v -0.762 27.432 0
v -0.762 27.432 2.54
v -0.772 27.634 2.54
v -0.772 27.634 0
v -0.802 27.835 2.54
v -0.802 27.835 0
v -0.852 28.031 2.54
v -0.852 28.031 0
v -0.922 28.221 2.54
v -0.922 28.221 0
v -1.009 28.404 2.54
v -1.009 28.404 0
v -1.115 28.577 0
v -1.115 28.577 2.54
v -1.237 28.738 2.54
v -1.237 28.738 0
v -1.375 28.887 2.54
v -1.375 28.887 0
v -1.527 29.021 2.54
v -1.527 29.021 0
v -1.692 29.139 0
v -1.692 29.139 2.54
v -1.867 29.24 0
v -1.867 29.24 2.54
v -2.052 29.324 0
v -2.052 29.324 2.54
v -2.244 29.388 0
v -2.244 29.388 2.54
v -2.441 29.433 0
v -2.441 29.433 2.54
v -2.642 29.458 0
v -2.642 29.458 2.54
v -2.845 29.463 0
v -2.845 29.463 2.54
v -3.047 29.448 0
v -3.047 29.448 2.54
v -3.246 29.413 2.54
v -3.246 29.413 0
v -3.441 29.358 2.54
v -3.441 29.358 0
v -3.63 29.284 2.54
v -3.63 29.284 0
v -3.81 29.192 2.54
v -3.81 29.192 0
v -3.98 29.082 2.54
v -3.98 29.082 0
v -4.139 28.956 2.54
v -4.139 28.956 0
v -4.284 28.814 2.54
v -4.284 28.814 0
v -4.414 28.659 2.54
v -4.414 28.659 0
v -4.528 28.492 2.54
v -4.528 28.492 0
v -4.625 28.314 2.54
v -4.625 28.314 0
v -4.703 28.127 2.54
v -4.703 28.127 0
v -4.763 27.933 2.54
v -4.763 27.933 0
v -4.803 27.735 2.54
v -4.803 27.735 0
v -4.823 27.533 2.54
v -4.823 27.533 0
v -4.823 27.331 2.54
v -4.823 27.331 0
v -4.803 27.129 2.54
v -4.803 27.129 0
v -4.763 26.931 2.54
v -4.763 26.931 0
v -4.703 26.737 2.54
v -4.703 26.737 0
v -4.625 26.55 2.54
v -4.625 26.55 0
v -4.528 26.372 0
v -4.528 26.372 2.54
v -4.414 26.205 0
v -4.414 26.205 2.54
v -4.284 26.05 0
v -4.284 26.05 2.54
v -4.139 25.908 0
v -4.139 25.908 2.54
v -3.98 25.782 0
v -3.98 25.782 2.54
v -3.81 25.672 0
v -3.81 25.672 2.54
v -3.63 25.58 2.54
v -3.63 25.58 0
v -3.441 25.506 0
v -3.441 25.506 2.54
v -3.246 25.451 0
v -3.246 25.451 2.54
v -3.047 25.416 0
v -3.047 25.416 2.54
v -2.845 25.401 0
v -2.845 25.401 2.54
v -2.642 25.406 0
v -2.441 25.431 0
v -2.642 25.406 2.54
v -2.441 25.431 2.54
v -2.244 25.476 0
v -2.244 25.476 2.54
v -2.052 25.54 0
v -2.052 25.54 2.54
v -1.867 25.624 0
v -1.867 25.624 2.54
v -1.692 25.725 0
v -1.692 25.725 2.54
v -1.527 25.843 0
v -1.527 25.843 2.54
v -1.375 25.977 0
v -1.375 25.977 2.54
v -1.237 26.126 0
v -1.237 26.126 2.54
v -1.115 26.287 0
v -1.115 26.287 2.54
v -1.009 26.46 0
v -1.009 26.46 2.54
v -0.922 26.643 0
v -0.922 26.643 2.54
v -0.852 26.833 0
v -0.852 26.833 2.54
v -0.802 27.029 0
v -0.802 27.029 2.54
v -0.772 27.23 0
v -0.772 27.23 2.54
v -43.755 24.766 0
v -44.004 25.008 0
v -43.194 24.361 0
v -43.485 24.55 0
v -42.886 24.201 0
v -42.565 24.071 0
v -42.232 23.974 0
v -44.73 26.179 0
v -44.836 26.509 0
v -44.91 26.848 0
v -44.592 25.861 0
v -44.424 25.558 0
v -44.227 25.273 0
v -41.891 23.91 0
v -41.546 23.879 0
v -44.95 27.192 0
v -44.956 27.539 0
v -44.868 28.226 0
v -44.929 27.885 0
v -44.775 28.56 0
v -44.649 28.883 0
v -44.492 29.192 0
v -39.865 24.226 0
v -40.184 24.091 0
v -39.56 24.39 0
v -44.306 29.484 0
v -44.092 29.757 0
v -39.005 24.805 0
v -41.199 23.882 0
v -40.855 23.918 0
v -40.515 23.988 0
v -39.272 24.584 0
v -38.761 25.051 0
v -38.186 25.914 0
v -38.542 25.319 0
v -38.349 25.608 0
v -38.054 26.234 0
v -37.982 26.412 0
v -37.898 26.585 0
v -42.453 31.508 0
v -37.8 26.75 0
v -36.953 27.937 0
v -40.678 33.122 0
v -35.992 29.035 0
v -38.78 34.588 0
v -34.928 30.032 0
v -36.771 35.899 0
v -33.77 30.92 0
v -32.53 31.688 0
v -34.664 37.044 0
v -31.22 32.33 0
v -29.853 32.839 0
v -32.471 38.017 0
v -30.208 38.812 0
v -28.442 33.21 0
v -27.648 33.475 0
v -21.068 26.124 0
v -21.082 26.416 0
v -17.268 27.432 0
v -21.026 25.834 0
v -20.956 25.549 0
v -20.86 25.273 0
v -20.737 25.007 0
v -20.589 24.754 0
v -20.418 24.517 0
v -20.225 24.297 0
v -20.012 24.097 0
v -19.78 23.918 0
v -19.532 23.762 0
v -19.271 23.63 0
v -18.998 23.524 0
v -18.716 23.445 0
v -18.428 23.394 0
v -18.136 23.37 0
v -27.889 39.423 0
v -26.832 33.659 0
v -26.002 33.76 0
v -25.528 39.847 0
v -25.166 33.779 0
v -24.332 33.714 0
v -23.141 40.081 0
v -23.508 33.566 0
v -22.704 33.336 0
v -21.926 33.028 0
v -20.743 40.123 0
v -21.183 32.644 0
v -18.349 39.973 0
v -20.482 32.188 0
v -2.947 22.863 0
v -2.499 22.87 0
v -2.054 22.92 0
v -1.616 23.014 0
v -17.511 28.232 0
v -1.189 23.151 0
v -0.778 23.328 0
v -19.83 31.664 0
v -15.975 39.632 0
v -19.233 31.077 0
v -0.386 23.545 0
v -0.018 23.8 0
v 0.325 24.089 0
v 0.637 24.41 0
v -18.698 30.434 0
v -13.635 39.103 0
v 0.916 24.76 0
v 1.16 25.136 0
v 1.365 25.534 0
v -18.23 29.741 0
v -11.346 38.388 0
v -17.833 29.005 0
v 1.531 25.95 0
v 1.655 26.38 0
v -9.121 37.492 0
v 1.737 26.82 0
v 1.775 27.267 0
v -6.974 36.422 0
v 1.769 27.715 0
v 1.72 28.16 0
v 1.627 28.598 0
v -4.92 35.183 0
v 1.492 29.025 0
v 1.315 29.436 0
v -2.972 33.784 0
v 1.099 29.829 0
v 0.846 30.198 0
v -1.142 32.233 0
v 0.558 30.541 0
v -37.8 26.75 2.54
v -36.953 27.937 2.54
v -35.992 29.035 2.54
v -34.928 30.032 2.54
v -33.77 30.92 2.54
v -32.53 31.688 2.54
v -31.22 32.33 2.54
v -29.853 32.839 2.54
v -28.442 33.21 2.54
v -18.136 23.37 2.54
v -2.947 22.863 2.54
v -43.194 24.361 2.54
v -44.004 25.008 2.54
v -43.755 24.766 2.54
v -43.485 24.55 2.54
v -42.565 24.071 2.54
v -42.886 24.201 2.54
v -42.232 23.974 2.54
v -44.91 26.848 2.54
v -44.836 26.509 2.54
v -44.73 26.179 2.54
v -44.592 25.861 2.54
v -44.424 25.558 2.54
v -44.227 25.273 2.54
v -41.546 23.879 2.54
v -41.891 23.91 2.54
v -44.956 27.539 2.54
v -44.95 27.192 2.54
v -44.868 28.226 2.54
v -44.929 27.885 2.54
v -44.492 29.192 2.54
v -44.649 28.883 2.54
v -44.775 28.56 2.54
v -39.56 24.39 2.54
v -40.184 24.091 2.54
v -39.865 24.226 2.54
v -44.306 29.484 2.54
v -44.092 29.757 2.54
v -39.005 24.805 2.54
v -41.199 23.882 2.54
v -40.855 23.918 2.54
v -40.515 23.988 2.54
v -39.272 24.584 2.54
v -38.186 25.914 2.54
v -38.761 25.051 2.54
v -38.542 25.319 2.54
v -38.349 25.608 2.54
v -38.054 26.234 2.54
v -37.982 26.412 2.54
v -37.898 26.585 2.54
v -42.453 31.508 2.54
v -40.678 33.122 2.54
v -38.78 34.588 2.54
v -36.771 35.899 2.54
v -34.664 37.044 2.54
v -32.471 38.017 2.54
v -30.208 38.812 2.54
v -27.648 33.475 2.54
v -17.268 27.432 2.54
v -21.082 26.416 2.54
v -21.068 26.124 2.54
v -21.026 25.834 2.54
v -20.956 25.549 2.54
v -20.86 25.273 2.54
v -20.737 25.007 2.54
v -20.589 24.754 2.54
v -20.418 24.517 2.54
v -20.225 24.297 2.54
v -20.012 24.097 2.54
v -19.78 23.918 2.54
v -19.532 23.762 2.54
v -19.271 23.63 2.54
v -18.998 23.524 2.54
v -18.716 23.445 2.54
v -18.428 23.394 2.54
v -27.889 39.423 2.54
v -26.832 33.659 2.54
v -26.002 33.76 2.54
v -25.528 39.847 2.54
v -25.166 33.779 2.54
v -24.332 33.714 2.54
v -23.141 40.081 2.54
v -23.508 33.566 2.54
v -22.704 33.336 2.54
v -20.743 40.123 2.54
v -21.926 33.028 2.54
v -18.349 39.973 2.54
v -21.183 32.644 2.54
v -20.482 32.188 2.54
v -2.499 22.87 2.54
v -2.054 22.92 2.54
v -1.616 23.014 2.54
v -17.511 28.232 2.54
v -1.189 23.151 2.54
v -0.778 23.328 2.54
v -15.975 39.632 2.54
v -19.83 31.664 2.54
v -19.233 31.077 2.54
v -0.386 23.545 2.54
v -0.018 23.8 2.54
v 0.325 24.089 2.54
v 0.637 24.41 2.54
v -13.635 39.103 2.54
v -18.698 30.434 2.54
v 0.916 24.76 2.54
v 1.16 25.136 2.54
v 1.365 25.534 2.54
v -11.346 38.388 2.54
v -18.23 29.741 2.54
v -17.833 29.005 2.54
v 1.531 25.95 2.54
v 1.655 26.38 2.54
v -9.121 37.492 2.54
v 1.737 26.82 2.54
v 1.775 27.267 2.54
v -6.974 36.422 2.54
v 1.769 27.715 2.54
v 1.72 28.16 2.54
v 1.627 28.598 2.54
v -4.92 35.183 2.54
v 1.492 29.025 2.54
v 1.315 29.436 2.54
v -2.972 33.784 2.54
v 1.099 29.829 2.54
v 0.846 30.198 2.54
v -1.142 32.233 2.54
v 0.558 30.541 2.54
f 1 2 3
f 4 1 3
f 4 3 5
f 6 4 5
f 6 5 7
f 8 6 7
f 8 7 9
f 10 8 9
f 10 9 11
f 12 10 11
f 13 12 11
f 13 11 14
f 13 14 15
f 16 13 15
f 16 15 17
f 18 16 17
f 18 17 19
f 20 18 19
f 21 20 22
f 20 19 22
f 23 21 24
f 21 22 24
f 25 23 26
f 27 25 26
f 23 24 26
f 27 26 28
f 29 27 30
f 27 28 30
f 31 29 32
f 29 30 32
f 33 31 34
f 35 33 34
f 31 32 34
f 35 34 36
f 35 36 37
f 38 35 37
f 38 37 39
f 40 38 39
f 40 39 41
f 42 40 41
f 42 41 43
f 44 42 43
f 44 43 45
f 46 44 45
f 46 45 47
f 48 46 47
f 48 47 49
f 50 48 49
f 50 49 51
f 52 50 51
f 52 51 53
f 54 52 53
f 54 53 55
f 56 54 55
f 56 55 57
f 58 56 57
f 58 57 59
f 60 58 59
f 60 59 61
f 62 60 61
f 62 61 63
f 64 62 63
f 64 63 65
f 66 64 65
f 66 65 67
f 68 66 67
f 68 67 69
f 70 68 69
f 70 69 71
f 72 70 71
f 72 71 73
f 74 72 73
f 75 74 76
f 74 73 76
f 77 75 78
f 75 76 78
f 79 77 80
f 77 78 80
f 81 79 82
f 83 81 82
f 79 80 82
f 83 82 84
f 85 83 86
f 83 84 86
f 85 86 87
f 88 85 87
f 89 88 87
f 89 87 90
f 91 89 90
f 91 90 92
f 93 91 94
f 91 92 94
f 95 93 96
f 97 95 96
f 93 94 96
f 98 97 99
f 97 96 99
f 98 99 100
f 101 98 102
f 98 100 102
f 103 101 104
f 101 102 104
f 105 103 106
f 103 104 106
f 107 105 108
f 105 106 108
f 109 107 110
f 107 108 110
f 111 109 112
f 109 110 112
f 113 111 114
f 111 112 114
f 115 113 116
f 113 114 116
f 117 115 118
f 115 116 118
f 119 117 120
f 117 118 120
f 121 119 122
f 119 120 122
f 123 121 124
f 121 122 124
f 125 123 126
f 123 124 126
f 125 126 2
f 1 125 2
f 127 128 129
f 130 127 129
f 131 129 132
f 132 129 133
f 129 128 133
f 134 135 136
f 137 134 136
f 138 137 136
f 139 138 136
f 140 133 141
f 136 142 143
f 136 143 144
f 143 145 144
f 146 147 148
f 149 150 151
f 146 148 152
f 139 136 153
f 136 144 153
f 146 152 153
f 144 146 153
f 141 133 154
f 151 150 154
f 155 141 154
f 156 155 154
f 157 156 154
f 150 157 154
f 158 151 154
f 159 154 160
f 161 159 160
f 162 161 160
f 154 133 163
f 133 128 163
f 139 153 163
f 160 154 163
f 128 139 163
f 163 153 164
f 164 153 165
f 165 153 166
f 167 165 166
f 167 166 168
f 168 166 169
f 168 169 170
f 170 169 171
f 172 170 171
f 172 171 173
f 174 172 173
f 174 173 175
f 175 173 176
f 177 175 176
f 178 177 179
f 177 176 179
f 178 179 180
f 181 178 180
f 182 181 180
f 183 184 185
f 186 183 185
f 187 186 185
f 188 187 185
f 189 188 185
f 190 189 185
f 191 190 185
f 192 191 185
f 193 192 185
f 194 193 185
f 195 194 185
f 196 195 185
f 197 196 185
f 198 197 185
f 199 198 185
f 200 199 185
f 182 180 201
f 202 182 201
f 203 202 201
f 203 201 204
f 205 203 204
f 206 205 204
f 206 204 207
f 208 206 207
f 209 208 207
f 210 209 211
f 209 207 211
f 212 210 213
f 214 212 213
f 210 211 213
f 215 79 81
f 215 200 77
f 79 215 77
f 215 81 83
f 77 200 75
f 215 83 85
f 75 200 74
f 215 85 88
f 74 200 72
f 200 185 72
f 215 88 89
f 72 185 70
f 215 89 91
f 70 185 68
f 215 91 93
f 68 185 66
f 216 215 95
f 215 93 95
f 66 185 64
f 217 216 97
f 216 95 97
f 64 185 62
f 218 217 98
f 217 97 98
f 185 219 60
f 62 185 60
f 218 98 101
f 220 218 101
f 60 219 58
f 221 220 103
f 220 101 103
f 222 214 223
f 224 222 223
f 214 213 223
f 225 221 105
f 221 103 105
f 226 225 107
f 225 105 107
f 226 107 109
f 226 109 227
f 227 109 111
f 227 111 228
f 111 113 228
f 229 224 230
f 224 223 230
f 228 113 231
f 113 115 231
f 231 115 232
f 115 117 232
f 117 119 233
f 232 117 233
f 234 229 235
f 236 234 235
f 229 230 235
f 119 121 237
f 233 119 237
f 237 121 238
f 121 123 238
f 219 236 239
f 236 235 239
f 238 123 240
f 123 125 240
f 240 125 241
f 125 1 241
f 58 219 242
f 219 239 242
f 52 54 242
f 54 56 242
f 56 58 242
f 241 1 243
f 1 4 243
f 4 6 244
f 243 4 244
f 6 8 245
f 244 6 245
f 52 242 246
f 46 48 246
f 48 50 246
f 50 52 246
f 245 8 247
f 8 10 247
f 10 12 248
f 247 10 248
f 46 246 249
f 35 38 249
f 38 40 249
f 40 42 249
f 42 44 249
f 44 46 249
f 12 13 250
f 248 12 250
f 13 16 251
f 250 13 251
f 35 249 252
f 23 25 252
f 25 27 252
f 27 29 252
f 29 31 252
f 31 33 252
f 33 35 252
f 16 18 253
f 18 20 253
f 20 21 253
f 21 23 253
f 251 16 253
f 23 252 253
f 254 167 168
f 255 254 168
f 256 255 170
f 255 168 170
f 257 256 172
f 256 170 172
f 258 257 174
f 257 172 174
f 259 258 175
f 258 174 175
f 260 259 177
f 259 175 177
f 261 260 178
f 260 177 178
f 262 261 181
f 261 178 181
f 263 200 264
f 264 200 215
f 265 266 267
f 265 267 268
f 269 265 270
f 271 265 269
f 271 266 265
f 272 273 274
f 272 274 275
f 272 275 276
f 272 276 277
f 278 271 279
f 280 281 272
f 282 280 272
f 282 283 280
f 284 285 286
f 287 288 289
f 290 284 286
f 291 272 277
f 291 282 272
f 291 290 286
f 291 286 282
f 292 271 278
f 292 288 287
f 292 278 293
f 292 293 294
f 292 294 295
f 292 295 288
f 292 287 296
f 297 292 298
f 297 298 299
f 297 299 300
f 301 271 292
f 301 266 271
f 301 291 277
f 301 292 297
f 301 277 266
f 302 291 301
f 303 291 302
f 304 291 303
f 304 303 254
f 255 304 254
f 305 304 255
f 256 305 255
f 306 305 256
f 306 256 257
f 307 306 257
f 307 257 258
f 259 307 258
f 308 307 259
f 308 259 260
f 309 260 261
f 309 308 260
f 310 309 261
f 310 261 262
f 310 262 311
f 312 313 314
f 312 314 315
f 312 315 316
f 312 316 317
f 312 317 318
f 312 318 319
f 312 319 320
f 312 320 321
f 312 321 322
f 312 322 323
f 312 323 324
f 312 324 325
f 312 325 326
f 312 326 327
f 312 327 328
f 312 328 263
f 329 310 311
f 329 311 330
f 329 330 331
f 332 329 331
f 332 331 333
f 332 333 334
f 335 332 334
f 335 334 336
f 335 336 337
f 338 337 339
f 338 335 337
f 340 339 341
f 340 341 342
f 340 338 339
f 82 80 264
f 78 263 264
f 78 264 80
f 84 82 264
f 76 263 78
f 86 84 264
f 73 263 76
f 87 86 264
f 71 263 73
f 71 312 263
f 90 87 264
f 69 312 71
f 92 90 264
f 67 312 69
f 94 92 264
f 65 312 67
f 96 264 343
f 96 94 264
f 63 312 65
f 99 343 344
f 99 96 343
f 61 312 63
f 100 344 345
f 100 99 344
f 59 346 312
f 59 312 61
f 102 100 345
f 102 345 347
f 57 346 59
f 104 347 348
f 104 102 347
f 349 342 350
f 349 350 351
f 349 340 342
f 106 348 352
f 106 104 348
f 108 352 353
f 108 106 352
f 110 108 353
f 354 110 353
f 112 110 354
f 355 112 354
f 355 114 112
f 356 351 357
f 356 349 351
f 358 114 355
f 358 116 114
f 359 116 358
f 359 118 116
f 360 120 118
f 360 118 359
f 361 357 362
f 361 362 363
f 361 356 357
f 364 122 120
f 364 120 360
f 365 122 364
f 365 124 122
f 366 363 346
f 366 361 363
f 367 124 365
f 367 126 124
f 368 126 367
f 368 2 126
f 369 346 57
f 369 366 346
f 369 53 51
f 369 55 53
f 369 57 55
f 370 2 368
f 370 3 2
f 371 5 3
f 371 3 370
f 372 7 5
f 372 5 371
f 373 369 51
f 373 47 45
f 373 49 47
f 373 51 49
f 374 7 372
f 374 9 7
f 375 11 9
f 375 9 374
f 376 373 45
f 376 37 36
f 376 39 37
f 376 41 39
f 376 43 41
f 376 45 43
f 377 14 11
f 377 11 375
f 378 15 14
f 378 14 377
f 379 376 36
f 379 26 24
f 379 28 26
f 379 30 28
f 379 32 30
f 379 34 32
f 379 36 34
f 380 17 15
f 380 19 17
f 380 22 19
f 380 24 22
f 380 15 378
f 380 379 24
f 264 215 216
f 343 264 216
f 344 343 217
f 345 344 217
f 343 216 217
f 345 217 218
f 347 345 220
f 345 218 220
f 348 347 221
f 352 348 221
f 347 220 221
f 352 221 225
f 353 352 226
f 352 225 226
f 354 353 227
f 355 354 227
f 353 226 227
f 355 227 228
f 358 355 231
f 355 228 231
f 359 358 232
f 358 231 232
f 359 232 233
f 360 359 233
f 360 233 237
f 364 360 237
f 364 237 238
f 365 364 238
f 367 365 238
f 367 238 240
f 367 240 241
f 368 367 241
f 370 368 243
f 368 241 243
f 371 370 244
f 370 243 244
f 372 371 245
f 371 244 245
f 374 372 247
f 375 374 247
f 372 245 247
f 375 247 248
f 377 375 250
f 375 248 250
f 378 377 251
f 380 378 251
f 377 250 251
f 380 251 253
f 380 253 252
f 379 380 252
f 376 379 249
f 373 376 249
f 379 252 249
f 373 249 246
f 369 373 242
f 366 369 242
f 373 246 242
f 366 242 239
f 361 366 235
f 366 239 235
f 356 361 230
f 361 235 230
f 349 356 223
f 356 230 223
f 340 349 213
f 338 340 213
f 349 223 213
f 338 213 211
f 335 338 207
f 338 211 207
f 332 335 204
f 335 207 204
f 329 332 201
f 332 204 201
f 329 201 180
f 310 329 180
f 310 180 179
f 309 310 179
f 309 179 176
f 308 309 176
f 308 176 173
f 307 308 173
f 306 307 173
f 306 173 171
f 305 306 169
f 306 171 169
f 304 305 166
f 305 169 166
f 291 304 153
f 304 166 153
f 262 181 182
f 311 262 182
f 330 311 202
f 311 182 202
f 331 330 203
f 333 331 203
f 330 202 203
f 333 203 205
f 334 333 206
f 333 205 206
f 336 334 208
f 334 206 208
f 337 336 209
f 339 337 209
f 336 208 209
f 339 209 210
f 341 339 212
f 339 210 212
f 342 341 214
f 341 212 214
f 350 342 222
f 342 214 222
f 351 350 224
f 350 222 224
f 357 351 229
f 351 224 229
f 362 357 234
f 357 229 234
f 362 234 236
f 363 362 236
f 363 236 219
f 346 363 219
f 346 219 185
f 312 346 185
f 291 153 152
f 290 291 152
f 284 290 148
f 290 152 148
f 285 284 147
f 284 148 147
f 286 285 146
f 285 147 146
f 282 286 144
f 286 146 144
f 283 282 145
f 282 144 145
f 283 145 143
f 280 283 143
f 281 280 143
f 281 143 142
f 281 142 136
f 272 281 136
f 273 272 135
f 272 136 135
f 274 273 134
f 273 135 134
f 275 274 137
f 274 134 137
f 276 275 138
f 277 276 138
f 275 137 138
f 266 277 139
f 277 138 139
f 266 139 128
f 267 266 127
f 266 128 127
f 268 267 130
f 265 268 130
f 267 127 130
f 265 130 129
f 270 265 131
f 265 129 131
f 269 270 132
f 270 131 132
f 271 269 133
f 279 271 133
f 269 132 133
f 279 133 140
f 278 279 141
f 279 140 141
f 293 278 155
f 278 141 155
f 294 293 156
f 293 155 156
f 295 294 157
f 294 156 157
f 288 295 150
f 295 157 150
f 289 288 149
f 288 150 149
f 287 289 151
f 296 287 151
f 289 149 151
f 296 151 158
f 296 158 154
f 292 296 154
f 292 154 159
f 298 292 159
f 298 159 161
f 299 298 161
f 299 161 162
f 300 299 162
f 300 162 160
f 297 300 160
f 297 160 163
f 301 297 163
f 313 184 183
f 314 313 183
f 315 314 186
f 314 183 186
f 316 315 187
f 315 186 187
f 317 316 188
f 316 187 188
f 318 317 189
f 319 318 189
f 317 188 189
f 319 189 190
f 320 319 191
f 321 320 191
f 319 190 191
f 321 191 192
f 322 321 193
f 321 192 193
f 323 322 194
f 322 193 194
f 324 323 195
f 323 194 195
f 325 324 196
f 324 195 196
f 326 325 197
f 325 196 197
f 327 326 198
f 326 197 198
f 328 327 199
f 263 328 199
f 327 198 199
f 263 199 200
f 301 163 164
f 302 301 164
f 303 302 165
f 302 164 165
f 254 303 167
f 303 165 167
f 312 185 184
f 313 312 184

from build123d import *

# Parameters (mm, degrees)
BOSS_EXTRUDE1_DEPTH = 2.54
SKETCH2_R           = 2.032
CUT_EXTRUDE1_DEPTH  = 61.316926471


with BuildPart() as part:
    # Sketch1 → Boss-Extrude1 (new body)
    with BuildSketch(Plane.XY):
        with BuildLine():
            Line((-18.135713172, 23.369697581), (-2.946569758, 22.862546371))
            ThreePointArc((-2.946569758, 22.862546371), (1.365281203, 25.533694473), (0.557997895, 30.541227253))
            ThreePointArc((0.557997895, 30.541227253), (-21.942363625, 40.125896641), (-44.092394737, 29.757276792))
            ThreePointArc((-44.092394737, 29.757276792), (-43.193963557, 24.360517848), (-38.053791843, 26.234236193))
            ThreePointArc((-38.053791843, 26.234236193), (-37.941623484, 26.499357867), (-37.800175961, 26.750084494))
            ThreePointArc((-37.800175961, 26.750084494), (-33.769573387, 30.919616017), (-28.44204105, 33.2105))
            ThreePointArc((-28.44204105, 33.2105), (-21.549726751, 32.845355593), (-17.268032218, 27.432))
            Line((-17.268032218, 27.432), (-21.082, 26.416))
            ThreePointArc((-21.082, 26.416), (-20.2249274, 24.29700469), (-18.135713172, 23.369697581))
        make_face()
    extrude(amount=BOSS_EXTRUDE1_DEPTH)

    # Sketch2 → Cut-Extrude1 (cut, through all)
    with BuildSketch(Plane.XY.offset(2.54)):
        with Locations((-2.794, 27.432)):
            Circle(SKETCH2_R)
    extrude(amount=-CUT_EXTRUDE1_DEPTH, mode=Mode.SUBTRACT)


solid = part.part
